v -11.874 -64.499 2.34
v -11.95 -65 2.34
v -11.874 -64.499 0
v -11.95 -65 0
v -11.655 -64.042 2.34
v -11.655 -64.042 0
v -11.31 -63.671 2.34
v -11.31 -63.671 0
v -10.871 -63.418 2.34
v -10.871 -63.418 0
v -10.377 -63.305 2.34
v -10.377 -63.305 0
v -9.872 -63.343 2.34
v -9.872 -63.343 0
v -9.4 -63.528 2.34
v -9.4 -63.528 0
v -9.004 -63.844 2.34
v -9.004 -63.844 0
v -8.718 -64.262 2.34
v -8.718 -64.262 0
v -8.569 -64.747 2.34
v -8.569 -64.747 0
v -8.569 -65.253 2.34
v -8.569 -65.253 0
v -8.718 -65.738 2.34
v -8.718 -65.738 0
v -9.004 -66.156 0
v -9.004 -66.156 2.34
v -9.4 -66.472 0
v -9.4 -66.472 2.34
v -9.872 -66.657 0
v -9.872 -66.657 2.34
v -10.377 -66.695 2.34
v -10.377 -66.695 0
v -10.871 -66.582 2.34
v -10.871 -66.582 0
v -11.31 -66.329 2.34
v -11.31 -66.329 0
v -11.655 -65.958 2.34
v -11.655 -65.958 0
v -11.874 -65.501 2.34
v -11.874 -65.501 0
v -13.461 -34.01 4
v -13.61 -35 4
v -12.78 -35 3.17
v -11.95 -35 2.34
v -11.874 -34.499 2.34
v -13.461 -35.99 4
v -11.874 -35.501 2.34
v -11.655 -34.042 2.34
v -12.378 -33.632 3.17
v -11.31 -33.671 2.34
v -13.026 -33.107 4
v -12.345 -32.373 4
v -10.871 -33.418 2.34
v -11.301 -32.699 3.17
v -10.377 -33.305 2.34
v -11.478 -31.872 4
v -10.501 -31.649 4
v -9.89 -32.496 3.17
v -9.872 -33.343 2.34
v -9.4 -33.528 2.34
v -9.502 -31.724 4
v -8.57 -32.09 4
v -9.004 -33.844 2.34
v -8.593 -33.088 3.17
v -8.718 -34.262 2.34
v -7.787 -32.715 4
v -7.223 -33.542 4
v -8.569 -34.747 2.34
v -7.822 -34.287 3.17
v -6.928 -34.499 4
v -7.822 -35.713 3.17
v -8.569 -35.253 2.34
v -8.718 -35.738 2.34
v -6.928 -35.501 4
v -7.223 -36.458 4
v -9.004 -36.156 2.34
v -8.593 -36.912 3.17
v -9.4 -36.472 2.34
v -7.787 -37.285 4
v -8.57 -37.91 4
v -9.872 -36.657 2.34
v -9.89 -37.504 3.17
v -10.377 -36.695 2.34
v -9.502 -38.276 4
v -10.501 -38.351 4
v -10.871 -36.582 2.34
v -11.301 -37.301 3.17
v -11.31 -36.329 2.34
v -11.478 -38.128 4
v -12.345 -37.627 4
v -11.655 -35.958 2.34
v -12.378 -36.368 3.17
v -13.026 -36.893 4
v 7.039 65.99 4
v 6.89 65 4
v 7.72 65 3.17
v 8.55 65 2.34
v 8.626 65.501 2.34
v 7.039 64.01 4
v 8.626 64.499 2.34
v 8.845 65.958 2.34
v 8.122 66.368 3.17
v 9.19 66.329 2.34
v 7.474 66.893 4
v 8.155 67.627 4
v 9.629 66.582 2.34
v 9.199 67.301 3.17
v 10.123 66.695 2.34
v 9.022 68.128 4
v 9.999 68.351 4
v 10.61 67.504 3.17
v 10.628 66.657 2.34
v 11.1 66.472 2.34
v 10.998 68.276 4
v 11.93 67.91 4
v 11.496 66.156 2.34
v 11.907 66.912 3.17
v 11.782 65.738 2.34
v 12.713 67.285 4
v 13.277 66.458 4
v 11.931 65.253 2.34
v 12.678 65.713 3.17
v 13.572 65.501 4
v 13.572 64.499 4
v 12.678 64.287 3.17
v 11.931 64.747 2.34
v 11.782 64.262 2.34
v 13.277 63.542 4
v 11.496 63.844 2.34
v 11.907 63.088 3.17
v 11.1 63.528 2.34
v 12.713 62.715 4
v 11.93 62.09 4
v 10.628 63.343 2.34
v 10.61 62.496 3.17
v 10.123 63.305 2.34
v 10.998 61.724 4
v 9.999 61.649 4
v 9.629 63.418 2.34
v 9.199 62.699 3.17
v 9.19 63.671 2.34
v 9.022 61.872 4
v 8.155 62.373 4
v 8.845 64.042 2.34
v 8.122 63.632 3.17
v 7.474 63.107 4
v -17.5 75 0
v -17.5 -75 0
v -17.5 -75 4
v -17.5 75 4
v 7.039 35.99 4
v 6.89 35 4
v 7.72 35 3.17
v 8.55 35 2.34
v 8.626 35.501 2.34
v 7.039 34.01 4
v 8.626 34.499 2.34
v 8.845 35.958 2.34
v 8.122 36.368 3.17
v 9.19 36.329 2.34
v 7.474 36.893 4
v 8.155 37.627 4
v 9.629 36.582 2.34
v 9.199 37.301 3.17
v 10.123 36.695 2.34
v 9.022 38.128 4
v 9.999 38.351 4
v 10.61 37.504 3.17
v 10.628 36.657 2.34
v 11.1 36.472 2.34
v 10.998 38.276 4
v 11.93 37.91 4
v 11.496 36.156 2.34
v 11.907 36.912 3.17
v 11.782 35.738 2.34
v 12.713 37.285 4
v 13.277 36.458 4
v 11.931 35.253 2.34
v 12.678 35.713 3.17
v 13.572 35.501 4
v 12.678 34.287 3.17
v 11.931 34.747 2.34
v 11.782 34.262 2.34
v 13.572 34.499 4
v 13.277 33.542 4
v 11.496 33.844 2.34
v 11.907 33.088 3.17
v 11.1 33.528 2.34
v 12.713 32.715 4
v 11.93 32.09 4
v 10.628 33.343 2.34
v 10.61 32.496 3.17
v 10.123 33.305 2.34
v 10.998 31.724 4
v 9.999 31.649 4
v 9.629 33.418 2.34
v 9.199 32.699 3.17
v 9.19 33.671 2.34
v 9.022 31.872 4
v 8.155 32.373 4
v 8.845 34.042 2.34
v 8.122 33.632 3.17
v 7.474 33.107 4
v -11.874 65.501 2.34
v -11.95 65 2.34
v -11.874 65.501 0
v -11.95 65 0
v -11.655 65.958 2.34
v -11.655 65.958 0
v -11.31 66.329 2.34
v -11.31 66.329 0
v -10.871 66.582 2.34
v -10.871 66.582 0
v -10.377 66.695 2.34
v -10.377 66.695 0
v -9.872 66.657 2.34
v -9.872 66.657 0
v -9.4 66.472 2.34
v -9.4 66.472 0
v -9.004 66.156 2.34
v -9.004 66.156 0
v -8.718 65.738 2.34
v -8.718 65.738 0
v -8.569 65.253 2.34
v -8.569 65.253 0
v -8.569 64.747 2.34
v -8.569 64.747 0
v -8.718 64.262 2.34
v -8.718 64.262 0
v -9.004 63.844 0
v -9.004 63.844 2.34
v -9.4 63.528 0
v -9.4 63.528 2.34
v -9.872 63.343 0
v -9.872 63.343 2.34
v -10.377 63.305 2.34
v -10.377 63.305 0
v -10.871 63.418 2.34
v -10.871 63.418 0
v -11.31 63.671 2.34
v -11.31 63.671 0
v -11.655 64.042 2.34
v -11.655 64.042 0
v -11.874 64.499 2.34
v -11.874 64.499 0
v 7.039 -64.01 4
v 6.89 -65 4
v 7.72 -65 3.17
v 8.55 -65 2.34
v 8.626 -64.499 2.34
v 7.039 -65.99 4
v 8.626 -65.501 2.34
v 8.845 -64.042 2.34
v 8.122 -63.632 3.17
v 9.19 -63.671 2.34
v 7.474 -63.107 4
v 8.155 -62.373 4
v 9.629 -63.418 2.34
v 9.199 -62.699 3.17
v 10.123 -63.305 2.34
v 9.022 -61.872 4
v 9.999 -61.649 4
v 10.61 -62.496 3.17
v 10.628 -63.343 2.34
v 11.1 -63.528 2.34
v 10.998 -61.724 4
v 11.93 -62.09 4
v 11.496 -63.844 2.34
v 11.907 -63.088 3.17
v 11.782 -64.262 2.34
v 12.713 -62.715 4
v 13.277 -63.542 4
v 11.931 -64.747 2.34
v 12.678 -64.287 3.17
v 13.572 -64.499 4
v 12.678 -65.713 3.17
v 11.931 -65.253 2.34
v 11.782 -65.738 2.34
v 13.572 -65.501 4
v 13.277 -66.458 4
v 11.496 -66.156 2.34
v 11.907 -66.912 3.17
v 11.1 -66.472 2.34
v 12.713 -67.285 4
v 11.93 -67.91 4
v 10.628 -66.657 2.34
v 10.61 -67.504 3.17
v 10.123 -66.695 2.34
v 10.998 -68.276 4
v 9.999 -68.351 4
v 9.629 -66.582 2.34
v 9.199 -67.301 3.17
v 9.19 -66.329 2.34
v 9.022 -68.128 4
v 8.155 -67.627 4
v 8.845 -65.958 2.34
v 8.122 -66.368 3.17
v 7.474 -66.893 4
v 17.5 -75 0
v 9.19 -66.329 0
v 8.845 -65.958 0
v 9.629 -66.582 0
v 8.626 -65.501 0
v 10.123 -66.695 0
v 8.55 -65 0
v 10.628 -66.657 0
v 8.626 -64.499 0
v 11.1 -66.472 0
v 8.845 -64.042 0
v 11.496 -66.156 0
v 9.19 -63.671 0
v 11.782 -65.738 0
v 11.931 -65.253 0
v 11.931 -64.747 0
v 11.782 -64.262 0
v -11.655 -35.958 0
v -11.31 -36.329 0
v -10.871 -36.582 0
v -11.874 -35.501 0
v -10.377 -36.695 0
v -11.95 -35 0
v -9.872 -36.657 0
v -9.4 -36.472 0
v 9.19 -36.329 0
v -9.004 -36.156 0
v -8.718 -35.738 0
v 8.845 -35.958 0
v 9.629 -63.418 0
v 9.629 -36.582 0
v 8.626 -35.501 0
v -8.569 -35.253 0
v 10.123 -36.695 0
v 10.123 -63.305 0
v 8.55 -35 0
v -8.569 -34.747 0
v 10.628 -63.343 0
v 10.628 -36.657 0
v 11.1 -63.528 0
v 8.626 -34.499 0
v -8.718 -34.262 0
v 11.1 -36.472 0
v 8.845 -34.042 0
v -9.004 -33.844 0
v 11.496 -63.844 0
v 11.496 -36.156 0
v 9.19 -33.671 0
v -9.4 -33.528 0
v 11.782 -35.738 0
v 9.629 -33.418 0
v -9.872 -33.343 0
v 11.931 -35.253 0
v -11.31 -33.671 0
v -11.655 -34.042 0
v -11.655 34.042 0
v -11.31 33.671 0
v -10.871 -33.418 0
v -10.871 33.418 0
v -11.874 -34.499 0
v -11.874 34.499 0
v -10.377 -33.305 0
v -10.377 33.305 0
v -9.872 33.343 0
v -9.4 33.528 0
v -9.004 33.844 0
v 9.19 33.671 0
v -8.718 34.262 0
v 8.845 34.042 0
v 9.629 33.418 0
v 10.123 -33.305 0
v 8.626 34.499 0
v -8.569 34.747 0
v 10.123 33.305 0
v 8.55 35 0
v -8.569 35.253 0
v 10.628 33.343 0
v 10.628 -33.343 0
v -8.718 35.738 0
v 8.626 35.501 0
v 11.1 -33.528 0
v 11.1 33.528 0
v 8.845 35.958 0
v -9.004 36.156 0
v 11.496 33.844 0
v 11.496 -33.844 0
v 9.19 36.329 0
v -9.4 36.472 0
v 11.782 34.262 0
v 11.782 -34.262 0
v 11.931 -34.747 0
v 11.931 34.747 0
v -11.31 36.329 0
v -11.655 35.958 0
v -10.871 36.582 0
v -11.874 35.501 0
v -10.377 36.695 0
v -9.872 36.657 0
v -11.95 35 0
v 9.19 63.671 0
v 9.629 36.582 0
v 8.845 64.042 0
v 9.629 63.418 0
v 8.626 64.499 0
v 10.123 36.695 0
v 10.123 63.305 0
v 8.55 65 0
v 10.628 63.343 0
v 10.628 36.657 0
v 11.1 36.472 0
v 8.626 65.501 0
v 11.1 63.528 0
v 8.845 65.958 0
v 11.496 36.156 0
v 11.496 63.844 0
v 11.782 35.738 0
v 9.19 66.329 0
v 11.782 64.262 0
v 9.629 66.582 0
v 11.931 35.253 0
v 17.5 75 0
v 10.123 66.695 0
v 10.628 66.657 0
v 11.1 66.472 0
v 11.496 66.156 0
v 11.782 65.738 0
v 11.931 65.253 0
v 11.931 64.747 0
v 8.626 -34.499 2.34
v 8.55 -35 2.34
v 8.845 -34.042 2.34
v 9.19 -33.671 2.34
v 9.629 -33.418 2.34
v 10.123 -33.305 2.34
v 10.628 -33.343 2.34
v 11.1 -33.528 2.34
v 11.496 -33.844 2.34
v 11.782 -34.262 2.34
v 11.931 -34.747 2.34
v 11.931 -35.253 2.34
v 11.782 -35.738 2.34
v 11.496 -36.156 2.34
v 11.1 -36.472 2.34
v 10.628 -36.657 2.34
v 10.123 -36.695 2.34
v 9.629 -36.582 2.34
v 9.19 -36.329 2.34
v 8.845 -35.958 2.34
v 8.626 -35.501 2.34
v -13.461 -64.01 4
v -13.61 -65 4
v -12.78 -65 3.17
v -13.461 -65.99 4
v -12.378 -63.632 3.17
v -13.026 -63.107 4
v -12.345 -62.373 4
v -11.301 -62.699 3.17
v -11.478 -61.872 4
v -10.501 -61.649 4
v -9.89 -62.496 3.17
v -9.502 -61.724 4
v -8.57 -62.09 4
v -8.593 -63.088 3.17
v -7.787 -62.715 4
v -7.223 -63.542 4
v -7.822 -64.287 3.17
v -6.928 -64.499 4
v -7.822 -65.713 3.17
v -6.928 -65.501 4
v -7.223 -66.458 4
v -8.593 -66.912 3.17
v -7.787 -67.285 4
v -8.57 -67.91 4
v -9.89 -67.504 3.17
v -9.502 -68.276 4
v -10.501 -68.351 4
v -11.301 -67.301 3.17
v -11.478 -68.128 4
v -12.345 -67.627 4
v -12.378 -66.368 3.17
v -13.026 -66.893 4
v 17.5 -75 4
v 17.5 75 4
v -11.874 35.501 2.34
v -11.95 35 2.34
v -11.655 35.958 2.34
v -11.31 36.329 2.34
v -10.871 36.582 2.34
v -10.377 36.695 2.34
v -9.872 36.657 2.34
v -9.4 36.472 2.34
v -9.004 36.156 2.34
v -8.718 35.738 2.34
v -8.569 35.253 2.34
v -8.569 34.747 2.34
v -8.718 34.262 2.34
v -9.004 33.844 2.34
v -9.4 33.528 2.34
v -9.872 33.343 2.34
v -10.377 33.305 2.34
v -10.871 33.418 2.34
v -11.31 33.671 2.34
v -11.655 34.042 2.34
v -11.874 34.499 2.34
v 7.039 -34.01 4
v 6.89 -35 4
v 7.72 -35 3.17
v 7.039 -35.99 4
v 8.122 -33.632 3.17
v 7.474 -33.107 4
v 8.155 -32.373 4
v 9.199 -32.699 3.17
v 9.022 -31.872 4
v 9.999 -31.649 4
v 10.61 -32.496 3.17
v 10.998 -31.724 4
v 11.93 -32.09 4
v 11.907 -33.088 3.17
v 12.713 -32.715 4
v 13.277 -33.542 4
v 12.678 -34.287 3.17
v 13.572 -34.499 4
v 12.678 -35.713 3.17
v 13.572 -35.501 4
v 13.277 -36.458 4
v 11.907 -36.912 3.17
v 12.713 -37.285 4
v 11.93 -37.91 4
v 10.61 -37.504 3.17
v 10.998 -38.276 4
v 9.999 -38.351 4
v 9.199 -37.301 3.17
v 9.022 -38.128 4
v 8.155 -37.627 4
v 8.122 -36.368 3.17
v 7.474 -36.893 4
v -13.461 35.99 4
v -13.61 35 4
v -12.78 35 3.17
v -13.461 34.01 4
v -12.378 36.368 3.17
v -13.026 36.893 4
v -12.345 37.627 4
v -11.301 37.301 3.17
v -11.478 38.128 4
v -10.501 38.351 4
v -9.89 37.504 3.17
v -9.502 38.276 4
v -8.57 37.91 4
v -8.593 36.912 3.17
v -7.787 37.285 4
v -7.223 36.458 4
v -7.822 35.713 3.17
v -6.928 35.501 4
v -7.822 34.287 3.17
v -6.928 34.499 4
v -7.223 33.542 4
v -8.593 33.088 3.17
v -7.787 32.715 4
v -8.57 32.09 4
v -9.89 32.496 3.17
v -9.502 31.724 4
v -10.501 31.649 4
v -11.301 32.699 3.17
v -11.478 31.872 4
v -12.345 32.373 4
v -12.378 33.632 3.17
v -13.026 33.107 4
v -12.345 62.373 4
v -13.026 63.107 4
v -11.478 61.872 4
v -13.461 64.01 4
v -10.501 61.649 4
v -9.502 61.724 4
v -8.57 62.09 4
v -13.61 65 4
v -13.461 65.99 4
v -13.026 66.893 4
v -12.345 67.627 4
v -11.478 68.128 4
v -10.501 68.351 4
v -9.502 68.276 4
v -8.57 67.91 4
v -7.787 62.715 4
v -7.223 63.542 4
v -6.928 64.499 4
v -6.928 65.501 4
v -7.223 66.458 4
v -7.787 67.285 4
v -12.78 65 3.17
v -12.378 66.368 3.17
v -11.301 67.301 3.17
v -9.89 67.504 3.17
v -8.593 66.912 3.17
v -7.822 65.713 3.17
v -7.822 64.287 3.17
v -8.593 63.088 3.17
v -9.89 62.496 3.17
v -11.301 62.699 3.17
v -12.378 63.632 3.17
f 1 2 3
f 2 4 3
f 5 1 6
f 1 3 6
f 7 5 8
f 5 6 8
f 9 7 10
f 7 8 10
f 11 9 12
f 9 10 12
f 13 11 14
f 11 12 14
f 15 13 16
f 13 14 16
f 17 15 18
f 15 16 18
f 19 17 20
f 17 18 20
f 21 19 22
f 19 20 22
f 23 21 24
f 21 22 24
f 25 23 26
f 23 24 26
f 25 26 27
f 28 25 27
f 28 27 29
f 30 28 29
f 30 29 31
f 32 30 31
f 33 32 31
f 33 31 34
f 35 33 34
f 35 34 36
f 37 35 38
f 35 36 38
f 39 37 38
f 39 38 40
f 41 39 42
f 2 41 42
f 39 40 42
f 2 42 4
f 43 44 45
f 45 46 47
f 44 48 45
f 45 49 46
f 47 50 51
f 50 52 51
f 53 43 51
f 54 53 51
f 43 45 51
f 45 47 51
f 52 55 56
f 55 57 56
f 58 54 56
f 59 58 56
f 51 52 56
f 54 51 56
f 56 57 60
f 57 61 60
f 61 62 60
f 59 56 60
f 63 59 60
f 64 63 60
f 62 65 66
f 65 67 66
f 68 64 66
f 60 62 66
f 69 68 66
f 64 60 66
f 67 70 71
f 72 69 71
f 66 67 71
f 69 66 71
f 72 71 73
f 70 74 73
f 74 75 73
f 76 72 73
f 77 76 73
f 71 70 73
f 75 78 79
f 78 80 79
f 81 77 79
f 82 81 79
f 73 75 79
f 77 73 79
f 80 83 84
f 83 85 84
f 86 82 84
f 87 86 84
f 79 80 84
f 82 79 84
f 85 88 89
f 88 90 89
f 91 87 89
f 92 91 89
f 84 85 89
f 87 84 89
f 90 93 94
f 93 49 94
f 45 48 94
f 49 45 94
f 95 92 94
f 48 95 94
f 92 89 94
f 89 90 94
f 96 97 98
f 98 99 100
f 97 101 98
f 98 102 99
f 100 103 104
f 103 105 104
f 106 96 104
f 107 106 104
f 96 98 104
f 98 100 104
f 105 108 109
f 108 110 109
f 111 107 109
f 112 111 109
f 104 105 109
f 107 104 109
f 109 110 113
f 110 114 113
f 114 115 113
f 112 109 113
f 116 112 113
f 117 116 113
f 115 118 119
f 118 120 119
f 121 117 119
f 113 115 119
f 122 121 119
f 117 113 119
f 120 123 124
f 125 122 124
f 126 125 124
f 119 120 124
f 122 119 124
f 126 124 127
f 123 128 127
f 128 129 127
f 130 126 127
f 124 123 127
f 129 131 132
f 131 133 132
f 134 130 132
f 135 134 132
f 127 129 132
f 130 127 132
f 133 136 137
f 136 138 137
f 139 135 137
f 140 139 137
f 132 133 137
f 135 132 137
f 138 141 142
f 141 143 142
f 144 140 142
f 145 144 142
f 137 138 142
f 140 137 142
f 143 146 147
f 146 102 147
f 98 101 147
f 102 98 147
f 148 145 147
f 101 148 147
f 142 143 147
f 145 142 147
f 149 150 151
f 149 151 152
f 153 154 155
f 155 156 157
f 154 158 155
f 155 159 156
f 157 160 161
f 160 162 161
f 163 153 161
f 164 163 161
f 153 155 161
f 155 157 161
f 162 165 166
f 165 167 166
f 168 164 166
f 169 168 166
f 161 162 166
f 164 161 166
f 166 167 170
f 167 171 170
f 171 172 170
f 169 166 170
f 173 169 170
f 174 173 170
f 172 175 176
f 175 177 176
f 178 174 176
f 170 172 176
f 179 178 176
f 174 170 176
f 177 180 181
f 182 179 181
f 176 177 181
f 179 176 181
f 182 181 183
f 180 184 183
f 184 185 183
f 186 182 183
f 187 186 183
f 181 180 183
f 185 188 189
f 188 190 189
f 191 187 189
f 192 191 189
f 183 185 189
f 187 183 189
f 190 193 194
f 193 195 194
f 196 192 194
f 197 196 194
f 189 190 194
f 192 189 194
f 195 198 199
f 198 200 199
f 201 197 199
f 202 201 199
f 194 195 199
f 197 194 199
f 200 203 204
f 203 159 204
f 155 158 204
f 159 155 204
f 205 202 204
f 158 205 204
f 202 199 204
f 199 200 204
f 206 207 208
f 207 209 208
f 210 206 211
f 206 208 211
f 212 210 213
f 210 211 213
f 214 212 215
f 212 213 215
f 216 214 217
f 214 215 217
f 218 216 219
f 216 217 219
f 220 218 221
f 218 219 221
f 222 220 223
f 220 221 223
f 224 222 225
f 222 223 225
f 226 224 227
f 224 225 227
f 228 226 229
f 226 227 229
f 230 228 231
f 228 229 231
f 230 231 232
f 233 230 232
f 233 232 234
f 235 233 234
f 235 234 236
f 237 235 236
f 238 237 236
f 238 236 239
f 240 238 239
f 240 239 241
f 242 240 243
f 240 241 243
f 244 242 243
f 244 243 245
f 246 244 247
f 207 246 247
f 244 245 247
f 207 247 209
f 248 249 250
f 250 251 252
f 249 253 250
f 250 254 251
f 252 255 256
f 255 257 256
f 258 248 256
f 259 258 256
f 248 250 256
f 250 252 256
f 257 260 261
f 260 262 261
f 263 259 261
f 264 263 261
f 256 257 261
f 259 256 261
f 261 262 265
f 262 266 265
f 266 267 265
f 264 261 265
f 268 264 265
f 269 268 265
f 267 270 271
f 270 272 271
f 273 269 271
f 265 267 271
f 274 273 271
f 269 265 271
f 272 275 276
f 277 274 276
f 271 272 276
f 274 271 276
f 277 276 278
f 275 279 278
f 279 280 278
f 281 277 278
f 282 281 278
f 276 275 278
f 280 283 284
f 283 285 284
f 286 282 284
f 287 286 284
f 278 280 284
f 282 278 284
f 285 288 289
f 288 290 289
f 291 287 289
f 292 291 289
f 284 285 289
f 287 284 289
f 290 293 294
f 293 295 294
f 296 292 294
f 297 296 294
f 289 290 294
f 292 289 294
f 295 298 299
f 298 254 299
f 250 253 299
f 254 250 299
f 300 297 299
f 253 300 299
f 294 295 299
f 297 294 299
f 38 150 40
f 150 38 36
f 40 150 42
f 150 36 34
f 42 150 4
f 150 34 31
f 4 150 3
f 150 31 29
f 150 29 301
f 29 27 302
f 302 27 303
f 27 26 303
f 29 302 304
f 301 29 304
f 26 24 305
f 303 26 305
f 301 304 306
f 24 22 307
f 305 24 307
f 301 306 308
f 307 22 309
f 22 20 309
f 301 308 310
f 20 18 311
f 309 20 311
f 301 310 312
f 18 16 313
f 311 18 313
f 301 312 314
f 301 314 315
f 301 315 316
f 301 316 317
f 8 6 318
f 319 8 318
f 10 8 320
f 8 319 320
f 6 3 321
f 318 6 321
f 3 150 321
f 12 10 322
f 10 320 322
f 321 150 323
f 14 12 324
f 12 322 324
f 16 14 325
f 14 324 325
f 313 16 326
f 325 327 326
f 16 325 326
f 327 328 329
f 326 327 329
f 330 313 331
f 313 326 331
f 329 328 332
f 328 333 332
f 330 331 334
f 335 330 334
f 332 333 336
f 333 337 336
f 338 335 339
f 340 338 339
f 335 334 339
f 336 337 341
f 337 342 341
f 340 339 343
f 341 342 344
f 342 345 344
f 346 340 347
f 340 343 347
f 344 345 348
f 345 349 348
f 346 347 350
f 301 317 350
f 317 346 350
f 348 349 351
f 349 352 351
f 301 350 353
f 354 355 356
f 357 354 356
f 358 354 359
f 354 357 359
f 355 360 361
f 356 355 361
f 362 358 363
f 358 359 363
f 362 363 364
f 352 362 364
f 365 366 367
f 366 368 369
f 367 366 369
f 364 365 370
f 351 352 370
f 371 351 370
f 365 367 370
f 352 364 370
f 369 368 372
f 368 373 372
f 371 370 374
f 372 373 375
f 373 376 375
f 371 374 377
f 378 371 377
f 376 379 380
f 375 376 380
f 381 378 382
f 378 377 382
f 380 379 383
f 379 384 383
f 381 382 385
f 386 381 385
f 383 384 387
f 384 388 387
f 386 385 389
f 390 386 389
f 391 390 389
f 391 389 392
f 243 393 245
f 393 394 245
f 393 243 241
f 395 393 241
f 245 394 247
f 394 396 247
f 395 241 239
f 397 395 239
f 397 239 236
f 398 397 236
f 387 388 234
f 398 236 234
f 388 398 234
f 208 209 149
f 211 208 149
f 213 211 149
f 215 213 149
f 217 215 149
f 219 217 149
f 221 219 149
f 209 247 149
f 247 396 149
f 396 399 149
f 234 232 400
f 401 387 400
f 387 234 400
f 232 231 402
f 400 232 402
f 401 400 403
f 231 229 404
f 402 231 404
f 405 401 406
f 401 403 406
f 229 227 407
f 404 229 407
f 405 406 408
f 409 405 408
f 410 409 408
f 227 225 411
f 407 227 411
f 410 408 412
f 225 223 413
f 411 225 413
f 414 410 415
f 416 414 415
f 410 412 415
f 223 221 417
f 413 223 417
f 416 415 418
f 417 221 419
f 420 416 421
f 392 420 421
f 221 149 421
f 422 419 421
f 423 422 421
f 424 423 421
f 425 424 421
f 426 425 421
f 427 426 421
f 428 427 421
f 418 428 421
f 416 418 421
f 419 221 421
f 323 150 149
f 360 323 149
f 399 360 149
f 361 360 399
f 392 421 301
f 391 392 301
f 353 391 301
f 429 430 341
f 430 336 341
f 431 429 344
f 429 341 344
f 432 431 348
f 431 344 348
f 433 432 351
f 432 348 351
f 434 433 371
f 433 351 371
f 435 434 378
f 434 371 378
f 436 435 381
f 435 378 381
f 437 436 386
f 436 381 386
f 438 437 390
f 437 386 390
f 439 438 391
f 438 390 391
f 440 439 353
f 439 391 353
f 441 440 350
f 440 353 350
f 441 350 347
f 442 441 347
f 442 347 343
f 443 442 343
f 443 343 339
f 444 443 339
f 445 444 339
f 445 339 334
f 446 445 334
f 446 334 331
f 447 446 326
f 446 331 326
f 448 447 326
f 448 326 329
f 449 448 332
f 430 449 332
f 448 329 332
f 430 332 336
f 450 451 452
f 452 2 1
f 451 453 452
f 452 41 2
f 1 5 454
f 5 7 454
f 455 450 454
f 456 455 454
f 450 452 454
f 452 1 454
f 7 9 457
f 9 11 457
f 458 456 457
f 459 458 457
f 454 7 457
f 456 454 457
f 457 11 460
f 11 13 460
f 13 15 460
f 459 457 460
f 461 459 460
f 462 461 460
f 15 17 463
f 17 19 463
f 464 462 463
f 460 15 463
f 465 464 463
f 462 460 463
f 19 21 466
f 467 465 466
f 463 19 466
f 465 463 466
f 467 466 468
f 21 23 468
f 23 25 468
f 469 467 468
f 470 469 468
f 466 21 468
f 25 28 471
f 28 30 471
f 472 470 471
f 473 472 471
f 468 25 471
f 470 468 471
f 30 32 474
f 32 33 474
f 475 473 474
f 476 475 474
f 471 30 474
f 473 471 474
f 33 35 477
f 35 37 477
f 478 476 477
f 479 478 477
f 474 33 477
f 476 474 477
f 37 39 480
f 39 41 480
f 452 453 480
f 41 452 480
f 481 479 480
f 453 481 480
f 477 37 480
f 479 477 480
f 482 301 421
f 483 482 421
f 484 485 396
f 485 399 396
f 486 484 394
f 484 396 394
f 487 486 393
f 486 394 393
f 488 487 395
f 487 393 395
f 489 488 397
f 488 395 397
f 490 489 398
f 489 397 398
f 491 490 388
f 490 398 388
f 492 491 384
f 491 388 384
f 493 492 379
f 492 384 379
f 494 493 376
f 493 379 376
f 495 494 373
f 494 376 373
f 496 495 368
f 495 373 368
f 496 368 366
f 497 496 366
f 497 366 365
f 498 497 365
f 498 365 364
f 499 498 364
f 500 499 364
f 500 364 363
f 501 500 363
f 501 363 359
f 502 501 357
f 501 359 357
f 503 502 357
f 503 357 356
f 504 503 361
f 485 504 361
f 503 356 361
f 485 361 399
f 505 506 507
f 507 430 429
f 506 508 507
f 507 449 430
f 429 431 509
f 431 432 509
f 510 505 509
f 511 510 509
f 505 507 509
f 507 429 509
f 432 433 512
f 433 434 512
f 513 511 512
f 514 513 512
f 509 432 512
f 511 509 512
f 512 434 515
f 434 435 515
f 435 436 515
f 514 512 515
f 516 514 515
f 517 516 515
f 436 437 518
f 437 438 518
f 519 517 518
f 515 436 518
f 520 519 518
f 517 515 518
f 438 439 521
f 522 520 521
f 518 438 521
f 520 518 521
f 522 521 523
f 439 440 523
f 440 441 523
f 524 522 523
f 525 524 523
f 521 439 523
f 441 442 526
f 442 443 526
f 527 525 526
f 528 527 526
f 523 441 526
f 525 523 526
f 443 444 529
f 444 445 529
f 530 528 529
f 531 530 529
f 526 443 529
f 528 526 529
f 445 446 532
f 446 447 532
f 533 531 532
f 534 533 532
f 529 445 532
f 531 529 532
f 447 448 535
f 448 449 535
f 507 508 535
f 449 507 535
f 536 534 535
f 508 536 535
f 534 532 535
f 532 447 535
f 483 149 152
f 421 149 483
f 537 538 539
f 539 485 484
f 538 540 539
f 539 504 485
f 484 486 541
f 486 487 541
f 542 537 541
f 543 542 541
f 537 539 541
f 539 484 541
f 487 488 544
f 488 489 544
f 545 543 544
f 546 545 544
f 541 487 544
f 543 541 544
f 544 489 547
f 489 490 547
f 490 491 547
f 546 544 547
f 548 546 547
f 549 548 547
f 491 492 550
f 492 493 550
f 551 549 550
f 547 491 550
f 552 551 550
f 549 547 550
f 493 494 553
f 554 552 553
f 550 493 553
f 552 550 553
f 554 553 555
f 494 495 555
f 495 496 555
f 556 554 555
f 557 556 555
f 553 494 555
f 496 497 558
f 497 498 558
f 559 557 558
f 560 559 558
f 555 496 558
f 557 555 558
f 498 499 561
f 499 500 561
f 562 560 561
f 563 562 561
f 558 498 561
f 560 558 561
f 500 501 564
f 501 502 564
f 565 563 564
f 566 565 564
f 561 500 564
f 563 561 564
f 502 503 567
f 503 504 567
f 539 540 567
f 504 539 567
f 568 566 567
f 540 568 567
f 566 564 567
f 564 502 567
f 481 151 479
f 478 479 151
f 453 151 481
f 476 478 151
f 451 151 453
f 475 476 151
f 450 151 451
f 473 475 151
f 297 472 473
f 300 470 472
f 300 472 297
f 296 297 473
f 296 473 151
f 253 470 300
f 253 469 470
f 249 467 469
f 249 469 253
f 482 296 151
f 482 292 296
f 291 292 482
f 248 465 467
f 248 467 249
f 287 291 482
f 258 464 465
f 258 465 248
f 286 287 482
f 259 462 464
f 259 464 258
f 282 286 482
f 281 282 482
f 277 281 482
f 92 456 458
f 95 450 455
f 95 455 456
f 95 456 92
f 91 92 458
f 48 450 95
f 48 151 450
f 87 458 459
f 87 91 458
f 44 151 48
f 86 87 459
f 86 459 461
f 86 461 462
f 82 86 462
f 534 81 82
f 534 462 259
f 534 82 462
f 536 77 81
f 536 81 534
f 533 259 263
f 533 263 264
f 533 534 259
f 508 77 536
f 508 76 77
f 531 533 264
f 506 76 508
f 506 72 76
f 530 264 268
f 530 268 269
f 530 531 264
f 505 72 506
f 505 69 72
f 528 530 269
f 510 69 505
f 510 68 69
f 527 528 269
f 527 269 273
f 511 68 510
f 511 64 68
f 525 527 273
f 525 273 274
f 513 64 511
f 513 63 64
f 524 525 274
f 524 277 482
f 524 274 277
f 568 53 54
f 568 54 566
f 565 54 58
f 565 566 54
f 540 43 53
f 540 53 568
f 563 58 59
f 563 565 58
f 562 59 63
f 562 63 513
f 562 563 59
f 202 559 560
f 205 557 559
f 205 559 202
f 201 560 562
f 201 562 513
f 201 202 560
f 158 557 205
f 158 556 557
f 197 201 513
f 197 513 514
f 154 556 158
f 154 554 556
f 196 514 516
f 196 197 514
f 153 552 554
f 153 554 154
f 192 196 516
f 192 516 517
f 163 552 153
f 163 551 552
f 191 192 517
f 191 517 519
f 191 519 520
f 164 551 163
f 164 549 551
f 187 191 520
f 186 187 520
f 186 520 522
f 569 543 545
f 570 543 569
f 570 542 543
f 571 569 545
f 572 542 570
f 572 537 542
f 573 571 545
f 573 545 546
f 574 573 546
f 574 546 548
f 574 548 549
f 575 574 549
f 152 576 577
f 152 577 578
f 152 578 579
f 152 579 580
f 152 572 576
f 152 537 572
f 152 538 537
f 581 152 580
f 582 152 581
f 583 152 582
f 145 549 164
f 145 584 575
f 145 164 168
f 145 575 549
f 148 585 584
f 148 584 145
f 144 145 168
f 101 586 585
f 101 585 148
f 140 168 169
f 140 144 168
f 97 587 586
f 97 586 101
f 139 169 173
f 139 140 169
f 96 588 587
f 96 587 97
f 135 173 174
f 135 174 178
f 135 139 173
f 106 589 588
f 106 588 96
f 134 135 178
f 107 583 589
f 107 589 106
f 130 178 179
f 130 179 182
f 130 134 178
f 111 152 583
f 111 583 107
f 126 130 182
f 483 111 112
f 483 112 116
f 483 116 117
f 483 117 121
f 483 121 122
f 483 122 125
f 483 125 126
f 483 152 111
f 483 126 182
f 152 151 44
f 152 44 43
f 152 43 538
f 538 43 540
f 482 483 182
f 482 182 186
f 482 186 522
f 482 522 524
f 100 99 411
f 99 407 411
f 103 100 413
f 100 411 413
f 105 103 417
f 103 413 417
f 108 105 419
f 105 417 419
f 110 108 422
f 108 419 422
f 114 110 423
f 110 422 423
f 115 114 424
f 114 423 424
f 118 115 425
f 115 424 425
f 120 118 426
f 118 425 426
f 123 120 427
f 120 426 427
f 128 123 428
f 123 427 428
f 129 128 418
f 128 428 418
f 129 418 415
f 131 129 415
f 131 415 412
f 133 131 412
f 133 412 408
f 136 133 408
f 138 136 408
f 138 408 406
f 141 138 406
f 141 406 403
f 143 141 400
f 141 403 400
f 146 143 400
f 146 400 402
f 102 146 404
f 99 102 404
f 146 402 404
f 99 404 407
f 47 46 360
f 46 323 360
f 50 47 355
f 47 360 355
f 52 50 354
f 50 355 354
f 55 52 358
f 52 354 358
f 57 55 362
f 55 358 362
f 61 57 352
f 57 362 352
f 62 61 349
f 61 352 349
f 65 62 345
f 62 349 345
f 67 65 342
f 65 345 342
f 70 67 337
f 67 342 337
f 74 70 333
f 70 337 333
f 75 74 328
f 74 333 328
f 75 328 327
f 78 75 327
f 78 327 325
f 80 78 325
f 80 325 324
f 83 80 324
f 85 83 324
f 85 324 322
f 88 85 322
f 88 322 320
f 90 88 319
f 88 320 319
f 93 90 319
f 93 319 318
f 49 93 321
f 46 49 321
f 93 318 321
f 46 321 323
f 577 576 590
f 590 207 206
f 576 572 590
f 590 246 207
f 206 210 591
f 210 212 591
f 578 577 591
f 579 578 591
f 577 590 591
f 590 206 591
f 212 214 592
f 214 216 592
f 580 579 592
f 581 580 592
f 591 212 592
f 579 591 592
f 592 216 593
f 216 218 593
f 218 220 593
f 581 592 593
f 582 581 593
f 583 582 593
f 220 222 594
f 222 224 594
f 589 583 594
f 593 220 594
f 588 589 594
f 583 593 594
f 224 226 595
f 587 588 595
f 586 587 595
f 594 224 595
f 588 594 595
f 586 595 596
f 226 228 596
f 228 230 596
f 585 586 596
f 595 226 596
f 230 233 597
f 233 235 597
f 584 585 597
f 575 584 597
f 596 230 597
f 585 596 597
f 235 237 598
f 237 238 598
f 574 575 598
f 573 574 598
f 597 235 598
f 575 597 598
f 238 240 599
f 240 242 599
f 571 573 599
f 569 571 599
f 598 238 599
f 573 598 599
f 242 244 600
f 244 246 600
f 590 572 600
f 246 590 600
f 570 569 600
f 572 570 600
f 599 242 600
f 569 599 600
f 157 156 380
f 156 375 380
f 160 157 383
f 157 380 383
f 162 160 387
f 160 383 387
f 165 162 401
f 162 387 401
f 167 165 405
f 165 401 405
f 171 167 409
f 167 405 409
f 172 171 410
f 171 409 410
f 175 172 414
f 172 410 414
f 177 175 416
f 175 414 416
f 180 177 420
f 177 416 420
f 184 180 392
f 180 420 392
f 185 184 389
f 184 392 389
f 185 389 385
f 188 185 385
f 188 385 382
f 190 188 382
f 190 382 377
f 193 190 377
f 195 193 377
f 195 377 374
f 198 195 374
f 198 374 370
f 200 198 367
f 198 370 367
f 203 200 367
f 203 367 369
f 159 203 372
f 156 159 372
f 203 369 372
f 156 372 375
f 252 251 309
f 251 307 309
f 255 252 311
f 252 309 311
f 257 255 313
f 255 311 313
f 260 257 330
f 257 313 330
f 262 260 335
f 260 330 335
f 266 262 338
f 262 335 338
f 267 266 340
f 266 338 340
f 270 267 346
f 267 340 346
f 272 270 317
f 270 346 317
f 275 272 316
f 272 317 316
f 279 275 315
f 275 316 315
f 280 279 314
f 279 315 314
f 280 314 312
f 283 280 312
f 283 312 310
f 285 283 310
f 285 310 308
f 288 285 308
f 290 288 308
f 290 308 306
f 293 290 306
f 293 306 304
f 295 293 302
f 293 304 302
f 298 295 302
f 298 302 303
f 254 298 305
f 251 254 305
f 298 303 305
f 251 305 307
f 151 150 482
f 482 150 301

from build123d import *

# Parameters (mm, degrees)
SKETCH_1_W                   = 35
SKETCH_1_H                   = 150
EXTRUDE_1_DEPTH              = 4
HOLE_WIZARD_M3_1_D           = 3.4
HOLE_WIZARD_M3_1_CSINK_D     = 6.72
HOLE_WIZARD_M3_1_CSINK_ANGLE = 90


with BuildPart() as part:
    # 草图1 → 凸台-拉伸1 (new body)
    with BuildSketch(Plane.XY):
        Rectangle(SKETCH_1_W, SKETCH_1_H)
    extrude(amount=EXTRUDE_1_DEPTH)

    # M3 六角凹锥坑螺钉的锥形沉头孔1 (through all)
    with Locations(Plane(origin=(-10.25, -35, 4), x_dir=(1, 0, 0), z_dir=(0, 0, 1))):
        with Locations((0, 0), (20.5, 0), (20.5, -30), (0, -30), (0, 100), (20.5, 100), (20.5, 70), (0, 70)):
            CounterSinkHole(HOLE_WIZARD_M3_1_D / 2, HOLE_WIZARD_M3_1_CSINK_D / 2, counter_sink_angle=HOLE_WIZARD_M3_1_CSINK_ANGLE)


solid = part.part
